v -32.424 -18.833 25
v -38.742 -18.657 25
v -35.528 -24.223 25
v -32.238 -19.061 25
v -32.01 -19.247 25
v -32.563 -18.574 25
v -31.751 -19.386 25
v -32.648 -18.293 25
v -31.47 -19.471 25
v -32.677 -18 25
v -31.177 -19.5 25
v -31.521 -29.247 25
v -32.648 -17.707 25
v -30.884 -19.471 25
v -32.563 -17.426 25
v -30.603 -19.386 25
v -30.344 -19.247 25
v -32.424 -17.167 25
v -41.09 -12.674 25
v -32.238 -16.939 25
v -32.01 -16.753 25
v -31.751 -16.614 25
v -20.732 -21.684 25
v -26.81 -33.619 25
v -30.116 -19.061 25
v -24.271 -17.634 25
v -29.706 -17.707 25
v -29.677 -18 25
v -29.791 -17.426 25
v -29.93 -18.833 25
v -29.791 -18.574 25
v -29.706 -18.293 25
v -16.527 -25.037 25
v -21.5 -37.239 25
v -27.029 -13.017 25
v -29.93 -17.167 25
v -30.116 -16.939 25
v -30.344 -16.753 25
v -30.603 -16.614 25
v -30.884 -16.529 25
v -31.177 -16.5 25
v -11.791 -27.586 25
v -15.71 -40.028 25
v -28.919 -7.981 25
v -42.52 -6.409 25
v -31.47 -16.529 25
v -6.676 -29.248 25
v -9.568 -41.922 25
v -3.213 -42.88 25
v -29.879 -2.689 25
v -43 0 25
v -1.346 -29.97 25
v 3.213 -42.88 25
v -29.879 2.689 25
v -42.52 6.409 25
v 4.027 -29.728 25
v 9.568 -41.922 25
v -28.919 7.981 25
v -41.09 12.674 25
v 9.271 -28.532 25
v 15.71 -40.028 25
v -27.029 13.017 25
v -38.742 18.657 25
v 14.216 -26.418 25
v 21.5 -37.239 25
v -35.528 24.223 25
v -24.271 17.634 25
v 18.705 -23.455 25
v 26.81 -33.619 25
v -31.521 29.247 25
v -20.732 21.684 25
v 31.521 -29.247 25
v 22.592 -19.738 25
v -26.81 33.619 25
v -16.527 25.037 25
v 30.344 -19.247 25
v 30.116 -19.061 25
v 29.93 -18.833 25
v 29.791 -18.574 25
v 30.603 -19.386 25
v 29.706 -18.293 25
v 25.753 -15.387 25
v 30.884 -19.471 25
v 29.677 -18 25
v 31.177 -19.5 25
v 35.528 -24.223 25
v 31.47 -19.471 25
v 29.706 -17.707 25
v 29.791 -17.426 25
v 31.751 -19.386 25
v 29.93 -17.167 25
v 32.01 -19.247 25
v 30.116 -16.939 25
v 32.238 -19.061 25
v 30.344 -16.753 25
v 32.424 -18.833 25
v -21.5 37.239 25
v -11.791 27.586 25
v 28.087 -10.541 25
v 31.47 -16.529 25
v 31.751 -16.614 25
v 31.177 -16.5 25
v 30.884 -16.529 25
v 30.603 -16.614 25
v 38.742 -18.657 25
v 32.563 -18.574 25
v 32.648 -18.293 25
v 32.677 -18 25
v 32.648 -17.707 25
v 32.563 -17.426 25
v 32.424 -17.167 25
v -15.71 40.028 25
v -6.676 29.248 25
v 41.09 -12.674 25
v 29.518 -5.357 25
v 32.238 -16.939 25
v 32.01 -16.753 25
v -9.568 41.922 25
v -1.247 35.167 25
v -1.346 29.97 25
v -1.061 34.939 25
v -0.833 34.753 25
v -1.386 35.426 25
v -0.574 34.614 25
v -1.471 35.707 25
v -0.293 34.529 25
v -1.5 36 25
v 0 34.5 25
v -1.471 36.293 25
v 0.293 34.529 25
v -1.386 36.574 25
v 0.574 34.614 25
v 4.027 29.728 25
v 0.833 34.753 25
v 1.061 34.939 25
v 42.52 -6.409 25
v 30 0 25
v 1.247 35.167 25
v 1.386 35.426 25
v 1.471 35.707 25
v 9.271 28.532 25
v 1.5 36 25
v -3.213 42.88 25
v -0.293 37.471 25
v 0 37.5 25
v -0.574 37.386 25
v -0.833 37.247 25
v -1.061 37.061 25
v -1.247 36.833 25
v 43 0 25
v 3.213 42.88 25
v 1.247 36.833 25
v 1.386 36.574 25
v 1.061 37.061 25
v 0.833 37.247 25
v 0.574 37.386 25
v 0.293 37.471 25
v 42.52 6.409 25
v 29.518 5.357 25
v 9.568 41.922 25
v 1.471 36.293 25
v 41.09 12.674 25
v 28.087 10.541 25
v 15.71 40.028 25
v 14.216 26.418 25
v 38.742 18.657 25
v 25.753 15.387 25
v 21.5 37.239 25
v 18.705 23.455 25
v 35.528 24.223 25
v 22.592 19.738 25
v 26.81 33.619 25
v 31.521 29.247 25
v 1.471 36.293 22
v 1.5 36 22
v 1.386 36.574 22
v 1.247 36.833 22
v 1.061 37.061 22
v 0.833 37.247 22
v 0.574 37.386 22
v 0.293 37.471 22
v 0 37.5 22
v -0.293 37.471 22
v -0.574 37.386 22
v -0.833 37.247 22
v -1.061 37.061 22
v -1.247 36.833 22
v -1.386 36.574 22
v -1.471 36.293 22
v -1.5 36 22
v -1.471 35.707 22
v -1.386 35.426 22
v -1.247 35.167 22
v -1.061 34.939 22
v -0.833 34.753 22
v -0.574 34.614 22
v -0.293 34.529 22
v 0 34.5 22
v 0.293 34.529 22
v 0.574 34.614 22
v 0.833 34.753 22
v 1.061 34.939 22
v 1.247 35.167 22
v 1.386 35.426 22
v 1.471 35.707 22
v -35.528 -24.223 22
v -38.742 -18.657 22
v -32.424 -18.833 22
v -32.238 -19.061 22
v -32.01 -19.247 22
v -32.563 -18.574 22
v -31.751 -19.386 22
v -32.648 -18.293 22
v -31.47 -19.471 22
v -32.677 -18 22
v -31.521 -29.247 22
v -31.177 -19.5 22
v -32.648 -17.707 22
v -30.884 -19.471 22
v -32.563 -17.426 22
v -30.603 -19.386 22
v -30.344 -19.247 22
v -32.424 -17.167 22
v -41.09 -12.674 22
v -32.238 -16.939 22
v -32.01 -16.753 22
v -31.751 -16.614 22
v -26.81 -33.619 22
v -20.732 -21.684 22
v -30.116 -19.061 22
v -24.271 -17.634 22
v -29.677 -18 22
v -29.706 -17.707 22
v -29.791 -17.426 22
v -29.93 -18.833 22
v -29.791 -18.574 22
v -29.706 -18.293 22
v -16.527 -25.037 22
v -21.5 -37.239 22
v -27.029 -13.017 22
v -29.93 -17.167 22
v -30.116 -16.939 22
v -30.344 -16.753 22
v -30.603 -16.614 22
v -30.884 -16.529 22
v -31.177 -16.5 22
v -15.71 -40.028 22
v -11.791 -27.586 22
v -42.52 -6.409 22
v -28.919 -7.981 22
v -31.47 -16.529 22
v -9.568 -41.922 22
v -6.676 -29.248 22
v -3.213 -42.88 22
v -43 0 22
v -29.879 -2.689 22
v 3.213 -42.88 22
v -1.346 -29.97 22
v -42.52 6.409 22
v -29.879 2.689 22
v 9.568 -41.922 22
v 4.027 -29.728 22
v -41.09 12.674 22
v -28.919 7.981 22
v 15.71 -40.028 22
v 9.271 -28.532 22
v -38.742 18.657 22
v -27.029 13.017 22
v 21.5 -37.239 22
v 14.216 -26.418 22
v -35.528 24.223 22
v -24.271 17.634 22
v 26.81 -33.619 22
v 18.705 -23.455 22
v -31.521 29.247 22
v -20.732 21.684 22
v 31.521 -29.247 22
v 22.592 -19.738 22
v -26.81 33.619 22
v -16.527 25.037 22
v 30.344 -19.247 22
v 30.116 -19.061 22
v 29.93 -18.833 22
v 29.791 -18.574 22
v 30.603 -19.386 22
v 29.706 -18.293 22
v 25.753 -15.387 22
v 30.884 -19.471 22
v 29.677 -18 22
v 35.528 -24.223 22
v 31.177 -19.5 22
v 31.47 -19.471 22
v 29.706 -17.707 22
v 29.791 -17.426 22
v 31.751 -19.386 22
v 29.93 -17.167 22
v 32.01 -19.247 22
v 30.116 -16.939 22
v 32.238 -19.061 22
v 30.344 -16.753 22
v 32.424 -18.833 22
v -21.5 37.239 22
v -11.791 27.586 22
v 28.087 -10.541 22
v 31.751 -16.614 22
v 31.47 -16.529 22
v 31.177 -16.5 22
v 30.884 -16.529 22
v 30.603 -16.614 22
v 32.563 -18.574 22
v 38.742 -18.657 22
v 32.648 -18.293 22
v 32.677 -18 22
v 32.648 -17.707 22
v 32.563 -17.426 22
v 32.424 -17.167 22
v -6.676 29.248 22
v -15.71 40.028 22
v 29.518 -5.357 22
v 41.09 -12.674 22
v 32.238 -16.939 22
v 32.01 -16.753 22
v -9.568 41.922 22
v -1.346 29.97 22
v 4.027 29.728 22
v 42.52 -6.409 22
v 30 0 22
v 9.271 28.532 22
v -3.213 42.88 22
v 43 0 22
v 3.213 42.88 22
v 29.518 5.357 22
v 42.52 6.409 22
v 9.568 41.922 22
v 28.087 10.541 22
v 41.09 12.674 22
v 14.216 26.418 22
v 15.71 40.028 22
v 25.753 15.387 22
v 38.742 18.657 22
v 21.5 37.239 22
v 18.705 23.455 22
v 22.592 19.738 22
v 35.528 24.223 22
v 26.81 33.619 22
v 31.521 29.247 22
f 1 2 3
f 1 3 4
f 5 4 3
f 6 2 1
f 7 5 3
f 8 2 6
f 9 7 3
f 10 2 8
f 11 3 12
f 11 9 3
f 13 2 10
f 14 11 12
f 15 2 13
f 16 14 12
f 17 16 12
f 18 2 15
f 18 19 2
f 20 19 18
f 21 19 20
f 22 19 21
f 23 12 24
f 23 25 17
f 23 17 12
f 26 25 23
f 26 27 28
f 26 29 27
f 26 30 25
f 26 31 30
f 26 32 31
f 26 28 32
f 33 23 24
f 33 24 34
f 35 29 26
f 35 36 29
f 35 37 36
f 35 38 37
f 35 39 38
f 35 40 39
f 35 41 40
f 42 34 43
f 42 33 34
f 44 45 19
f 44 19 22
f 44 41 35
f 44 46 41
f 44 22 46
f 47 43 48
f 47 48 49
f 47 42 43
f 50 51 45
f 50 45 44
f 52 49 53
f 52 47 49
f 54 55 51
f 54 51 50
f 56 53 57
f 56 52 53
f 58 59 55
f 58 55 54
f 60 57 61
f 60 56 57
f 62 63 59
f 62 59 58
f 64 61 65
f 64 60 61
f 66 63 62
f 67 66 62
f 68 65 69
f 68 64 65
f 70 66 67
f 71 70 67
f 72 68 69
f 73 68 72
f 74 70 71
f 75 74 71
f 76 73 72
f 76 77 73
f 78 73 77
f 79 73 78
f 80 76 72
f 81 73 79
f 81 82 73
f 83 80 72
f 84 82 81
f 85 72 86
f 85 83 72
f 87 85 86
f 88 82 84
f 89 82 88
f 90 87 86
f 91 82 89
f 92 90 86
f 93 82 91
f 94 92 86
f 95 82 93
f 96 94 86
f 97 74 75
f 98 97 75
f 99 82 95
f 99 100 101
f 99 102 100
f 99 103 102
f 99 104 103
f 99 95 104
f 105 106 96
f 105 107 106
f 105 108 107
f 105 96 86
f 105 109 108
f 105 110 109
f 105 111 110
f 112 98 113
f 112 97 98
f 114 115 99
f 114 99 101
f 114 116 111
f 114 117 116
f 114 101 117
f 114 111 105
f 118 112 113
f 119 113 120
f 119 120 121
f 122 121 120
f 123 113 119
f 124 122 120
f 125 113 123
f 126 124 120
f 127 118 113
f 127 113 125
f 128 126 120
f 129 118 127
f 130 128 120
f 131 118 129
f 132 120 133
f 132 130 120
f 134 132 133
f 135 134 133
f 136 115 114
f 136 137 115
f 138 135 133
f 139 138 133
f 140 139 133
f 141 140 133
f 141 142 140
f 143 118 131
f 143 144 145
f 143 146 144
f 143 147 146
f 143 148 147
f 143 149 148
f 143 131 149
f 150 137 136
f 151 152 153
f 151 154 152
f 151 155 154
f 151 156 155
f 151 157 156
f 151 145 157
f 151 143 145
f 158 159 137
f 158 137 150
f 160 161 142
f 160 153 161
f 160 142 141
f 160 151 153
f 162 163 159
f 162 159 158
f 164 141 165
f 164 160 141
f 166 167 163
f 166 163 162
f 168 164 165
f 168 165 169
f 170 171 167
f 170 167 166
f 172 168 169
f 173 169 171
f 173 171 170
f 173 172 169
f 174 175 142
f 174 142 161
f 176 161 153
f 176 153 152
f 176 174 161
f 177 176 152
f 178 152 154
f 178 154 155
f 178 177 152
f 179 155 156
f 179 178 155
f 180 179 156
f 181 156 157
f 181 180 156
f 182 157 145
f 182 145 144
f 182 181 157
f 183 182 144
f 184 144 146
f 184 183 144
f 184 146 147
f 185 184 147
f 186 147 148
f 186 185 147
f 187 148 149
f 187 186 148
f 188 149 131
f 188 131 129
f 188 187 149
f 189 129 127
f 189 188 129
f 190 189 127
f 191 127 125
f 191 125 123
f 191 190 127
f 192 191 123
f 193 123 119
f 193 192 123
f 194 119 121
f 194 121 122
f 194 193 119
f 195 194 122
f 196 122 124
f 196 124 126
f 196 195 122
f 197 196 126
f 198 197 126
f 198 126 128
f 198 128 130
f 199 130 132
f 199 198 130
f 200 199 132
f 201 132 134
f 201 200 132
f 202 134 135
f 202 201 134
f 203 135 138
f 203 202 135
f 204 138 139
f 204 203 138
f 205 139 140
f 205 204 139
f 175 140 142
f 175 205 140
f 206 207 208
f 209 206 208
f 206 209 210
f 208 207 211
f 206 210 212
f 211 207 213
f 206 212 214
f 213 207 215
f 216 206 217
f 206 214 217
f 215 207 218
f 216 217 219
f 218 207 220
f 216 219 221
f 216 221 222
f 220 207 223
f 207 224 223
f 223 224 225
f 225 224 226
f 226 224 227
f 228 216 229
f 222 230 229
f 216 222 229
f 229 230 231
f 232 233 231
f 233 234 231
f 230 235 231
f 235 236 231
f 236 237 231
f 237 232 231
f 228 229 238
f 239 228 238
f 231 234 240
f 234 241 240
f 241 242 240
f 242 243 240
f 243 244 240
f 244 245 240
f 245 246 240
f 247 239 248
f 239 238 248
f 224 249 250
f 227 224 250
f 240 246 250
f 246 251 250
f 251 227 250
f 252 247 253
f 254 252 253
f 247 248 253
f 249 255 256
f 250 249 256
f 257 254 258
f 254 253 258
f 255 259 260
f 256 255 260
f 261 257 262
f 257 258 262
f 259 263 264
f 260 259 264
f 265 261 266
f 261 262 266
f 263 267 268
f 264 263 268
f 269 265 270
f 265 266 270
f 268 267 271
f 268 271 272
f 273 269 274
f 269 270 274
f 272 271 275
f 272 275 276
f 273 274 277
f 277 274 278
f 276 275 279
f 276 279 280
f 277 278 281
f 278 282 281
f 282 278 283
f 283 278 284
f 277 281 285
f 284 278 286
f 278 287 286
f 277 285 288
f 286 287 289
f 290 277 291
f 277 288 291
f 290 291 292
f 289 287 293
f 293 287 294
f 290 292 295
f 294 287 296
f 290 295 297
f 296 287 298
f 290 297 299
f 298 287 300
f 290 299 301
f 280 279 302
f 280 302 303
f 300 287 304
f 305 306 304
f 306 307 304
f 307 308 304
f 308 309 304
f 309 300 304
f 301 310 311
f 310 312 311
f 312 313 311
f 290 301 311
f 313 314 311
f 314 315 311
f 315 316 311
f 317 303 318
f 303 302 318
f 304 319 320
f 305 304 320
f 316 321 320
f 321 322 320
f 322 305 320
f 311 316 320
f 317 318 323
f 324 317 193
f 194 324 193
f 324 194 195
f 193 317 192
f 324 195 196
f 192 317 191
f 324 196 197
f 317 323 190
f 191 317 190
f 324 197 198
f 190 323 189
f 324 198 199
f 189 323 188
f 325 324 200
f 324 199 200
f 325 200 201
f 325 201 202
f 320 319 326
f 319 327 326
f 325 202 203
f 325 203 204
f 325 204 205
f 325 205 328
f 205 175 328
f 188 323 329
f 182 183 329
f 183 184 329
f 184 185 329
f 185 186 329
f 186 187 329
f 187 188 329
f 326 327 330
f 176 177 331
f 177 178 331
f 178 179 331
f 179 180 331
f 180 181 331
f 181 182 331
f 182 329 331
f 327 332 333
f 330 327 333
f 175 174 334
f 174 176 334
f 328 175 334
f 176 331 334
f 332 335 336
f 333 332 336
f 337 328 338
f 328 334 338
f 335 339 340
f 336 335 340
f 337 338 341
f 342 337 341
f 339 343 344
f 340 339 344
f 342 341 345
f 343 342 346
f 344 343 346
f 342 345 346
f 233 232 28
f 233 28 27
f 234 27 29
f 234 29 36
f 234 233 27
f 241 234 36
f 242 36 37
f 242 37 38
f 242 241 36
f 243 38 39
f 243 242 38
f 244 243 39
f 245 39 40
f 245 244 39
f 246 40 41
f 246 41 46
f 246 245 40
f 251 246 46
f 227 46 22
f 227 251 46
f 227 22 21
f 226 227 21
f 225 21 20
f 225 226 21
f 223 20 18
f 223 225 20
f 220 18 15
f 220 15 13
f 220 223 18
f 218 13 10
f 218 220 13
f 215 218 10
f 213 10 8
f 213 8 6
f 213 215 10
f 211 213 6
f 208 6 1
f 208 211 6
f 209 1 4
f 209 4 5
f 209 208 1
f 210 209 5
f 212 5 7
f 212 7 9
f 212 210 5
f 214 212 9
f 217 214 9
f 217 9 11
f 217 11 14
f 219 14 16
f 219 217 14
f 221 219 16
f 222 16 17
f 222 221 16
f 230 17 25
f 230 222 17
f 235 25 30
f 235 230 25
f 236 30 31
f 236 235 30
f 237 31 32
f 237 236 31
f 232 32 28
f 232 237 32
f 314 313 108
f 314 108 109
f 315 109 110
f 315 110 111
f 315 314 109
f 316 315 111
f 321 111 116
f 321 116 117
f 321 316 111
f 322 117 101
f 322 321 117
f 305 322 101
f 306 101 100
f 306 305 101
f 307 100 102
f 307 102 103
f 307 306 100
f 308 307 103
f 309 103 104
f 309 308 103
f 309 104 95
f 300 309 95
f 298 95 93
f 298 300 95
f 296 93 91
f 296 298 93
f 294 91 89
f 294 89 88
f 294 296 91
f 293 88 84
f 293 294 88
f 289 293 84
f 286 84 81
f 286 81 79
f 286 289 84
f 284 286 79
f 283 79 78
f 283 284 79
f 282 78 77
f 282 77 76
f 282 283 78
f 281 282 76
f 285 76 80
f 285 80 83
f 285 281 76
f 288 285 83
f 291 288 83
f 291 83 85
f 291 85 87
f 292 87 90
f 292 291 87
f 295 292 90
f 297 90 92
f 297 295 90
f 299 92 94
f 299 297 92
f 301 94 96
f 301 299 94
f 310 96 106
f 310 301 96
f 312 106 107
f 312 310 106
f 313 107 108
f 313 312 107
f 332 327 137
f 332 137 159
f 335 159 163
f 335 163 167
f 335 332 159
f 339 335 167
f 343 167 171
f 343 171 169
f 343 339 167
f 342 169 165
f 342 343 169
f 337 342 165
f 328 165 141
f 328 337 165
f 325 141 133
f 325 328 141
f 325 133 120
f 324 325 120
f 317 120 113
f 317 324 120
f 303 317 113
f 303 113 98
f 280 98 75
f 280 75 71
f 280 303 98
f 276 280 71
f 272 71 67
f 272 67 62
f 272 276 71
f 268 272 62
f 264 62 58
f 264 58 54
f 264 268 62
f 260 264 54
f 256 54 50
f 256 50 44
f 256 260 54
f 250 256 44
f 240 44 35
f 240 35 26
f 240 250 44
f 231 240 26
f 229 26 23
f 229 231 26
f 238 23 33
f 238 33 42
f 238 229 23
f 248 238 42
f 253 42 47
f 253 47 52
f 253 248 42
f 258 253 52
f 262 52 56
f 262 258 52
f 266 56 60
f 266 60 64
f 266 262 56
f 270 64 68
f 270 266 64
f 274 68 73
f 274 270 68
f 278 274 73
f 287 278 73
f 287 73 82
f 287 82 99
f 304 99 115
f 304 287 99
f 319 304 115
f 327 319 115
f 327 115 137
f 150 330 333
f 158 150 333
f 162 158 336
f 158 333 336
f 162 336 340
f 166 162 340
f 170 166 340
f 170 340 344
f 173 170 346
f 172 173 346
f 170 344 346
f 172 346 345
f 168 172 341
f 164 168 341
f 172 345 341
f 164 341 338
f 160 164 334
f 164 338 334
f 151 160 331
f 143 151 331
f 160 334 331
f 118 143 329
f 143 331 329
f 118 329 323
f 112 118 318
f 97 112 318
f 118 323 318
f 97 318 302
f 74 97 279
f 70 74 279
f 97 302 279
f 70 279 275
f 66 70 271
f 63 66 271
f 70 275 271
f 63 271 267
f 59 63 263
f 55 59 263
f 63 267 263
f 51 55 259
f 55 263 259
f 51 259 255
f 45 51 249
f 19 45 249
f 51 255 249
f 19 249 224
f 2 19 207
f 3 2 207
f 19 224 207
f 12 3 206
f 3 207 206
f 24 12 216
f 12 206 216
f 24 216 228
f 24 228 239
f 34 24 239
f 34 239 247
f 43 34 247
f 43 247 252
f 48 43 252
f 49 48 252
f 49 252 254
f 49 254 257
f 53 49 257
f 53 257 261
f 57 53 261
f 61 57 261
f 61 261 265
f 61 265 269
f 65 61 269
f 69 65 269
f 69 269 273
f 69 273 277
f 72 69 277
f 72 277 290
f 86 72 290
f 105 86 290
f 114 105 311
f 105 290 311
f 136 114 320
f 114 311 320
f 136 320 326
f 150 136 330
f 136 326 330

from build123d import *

# Parameters (mm, degrees)
SKETCH006_R   = 43
SKETCH006_R_2 = 1.5
SKETCH006_R_3 = 30
PAD_DEPTH     = 3


with BuildPart() as part:
    # Sketch006 → Pad (new body)
    with BuildSketch(Plane.XY.offset(22)):
        Circle(SKETCH006_R)
        with Locations((0, 36)):
            Circle(SKETCH006_R_2, mode=Mode.SUBTRACT)
        with Locations((31.176915, -18)):
            Circle(SKETCH006_R_2, mode=Mode.SUBTRACT)
        with Locations((-31.176915, -18)):
            Circle(SKETCH006_R_2, mode=Mode.SUBTRACT)
        Circle(SKETCH006_R_3, mode=Mode.SUBTRACT)
    extrude(amount=PAD_DEPTH)


solid = part.part
